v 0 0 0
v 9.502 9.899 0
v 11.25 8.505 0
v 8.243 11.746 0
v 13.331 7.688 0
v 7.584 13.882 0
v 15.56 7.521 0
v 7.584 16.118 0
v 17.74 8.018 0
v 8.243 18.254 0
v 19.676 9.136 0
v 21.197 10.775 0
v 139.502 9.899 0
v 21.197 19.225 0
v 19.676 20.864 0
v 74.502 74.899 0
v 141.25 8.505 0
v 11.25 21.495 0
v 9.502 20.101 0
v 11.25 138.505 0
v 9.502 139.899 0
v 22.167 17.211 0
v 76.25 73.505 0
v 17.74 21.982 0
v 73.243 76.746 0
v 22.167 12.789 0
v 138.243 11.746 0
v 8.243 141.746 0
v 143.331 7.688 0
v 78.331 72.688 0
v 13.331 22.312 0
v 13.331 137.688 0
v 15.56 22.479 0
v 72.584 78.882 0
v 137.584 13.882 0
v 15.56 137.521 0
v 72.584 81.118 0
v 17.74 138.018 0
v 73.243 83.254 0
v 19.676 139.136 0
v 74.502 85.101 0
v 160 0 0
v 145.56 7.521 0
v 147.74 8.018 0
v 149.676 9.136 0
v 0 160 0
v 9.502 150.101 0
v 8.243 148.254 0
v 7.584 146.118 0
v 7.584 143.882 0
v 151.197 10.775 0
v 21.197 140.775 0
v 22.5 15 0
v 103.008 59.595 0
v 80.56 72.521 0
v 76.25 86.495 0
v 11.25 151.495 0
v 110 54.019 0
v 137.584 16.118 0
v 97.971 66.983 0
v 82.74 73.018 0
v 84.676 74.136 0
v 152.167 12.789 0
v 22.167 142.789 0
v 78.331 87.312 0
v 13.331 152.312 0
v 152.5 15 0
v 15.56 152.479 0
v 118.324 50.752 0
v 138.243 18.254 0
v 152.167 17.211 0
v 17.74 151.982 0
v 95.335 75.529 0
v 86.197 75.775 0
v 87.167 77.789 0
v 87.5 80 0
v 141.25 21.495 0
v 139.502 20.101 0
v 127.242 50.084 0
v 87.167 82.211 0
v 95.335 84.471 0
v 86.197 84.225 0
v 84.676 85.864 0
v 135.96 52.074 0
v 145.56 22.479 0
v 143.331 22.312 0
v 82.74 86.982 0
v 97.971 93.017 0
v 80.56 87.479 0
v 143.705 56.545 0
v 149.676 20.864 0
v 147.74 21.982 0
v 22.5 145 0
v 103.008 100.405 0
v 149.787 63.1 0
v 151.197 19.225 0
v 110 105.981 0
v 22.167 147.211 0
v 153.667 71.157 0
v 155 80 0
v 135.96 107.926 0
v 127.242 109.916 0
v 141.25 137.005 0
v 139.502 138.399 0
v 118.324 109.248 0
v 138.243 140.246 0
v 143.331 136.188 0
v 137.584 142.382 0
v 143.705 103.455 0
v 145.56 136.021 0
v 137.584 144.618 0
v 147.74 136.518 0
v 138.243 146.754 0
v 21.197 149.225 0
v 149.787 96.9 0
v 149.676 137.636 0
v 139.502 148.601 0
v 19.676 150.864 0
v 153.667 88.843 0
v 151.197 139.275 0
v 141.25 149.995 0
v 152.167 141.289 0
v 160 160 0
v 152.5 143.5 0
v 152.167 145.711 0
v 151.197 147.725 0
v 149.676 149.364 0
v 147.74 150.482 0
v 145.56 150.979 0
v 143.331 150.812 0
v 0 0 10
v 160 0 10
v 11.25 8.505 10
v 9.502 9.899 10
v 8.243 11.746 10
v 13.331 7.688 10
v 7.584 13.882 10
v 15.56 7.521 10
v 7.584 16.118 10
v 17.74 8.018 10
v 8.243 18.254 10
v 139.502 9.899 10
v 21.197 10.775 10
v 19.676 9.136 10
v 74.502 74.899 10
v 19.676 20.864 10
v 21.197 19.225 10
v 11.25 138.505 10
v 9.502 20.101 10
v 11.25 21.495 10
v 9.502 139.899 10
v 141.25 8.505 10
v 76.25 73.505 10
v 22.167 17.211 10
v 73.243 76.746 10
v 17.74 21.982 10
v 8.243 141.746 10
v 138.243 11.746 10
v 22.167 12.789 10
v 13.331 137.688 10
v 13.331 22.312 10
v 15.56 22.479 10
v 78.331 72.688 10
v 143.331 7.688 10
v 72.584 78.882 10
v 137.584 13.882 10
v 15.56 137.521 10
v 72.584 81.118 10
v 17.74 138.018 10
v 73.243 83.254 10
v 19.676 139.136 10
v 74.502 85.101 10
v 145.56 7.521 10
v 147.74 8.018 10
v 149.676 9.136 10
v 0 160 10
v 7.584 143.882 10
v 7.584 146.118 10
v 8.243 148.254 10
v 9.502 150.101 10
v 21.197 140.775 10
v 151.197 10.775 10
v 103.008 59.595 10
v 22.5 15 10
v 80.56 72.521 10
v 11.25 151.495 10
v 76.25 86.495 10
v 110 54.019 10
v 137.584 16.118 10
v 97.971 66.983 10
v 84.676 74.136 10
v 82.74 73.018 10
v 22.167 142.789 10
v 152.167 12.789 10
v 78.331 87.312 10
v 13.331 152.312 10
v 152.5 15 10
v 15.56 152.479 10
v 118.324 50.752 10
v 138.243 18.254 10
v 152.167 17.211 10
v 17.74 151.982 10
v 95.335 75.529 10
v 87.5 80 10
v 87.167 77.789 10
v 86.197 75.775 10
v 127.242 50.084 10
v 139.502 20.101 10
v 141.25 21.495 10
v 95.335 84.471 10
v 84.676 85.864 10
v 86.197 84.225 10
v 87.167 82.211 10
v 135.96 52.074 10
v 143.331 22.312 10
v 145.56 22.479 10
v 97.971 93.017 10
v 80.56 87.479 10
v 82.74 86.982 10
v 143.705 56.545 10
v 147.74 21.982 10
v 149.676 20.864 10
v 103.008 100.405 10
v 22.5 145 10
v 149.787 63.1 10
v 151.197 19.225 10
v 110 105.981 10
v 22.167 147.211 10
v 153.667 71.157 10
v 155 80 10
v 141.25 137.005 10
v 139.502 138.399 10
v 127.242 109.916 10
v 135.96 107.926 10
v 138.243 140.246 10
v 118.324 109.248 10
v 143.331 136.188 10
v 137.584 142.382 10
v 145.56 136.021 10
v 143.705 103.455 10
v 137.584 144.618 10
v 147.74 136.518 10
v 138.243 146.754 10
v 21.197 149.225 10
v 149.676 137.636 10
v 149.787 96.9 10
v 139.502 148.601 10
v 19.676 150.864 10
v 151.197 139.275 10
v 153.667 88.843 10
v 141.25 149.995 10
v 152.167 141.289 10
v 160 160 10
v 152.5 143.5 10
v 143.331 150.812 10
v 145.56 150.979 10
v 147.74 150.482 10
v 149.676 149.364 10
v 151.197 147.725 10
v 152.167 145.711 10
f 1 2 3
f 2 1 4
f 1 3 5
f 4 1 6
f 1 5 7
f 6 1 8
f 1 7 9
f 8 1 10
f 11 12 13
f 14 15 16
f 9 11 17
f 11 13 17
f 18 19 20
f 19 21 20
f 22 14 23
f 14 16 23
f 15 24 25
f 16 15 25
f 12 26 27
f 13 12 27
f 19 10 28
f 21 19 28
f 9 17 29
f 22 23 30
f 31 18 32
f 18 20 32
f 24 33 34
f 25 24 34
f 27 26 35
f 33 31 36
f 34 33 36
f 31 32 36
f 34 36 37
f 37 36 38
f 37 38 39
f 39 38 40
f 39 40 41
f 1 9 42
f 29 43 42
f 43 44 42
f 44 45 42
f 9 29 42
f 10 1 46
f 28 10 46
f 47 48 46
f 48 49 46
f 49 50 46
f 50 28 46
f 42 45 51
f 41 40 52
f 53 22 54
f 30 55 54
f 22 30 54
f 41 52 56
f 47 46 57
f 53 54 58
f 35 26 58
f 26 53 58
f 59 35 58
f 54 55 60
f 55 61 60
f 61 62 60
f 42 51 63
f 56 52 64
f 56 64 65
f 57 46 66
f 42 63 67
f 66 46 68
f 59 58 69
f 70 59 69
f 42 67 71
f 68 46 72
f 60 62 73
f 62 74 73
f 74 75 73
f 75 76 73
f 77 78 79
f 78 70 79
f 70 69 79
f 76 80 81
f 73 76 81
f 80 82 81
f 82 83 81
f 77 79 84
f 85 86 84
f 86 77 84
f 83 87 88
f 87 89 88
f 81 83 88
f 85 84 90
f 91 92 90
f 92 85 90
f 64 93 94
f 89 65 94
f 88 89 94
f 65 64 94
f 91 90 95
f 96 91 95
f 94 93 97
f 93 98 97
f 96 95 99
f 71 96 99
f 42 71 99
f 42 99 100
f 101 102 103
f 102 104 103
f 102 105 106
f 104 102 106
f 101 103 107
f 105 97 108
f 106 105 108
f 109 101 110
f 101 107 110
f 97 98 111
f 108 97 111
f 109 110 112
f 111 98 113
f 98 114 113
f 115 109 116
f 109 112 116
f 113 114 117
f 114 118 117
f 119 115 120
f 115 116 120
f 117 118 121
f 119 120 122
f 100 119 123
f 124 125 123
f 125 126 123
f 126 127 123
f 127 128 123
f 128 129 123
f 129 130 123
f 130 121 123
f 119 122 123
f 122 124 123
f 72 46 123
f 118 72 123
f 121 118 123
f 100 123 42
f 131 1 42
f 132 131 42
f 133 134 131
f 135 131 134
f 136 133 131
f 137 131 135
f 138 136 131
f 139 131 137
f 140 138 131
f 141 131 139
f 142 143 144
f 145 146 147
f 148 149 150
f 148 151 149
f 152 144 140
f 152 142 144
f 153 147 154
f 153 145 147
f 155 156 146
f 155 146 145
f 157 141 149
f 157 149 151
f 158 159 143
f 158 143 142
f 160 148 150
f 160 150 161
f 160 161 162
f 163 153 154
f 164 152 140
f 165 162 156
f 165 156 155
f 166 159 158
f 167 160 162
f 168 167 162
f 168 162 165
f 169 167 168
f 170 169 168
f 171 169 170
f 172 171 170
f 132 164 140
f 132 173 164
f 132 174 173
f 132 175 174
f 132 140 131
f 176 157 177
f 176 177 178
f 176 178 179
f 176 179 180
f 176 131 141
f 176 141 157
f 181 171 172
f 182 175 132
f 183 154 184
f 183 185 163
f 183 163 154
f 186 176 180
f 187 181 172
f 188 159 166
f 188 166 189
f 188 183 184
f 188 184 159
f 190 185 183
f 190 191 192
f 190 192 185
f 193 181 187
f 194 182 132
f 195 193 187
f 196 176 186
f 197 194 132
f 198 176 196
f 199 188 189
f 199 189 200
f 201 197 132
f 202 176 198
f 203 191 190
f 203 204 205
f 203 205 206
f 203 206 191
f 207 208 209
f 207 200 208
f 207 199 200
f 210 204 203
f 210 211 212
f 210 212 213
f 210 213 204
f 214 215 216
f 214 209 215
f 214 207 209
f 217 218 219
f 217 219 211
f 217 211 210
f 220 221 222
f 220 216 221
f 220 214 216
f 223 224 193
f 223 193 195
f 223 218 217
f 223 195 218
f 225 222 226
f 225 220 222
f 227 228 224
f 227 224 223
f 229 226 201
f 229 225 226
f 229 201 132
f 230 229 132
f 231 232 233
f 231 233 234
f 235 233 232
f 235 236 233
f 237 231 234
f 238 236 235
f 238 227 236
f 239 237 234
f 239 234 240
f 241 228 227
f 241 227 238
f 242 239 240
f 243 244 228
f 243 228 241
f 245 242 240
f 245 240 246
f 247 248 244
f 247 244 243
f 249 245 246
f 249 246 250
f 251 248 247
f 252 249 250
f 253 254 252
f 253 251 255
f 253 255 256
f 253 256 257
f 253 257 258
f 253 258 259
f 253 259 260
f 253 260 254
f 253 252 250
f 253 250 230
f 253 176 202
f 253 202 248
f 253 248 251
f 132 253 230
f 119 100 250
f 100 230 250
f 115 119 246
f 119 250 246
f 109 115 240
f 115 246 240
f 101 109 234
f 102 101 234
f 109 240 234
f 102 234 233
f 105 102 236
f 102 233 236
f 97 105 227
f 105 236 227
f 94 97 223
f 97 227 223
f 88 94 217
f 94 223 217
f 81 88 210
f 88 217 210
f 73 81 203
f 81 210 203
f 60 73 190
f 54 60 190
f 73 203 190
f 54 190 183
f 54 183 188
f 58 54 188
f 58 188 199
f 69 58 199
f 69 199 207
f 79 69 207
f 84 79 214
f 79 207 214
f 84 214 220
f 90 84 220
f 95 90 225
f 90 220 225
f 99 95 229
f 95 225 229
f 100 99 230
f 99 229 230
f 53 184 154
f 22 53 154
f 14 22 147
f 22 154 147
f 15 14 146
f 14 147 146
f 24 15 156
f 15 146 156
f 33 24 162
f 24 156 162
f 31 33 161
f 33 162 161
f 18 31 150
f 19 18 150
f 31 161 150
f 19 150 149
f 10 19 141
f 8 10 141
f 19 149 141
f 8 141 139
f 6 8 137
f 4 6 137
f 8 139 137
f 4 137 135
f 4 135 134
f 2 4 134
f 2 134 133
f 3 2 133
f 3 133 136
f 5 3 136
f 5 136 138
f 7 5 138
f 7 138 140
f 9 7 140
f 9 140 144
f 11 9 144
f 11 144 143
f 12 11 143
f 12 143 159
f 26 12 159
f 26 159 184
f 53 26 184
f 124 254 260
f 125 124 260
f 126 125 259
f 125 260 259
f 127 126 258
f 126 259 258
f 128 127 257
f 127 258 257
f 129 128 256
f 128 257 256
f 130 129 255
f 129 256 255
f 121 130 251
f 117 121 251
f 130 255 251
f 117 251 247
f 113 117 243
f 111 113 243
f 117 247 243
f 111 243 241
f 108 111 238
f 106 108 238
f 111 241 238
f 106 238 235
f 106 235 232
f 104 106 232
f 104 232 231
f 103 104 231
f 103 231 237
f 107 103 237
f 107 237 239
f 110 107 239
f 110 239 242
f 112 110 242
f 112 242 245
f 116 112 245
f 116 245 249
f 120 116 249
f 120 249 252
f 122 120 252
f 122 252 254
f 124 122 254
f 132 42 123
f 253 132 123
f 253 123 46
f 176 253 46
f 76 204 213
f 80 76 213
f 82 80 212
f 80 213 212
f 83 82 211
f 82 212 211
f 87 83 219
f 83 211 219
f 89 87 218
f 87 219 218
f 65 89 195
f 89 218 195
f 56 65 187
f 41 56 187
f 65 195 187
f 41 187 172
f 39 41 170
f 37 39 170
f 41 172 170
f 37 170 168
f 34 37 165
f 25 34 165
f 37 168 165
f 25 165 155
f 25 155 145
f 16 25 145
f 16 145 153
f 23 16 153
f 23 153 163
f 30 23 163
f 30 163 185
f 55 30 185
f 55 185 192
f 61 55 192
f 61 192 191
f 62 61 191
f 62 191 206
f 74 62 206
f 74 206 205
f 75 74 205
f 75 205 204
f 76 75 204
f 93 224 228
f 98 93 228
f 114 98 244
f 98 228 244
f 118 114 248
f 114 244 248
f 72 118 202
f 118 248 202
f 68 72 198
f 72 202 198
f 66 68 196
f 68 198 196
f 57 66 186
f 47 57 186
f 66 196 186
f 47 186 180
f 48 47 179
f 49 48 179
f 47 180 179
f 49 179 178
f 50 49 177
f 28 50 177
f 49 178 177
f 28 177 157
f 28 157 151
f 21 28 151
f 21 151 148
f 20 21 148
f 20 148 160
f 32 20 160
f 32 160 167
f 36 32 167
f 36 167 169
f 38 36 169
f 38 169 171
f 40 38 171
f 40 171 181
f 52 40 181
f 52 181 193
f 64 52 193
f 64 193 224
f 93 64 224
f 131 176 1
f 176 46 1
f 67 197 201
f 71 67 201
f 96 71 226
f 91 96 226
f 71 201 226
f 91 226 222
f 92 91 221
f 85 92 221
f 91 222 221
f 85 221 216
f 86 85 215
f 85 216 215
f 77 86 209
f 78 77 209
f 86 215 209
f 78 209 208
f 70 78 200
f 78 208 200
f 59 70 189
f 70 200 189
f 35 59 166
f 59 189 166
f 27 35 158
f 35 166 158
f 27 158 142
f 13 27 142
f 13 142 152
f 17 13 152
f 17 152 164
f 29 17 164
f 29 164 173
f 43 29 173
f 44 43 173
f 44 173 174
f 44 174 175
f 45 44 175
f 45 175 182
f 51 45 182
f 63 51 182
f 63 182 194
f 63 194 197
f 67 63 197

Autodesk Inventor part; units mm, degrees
ref_plane "YZ Plane" through (0, 0, 0) normal (1, 0, 0) x (0, 1, 0)
ref_plane "XZ Plane" through (0, 0, 0) normal (0, 1, 0) x (-1, 0, 0)
ref_plane "XY Plane" through (0, 0, 0) normal (0, 0, 1) x (1, 0, 0)
sketch "Sketch1" plane through (0, 0, 0) normal (0, 0, 1) x (1, 0, 0)
  line L0 (0, 0) -> (160, 0)
  line L1 (160, 0) -> (160, 160)
  line L2 (160, 160) -> (0, 160)
  line L3 (0, 160) -> (0, 0)
  dimension "d0" = 160
  dimension "d1" = 160
extrude "Extrusion1" add sketch "Sketch1" along normal blind 10
sketch "Sketch2" plane through (0, 0, 10) normal (0, 0, 1) x (1, 0, 0)
  line L0 (0, 0) -> (160, 0) projected
  line L1 (0, 0) -> (15, 0)
  line L2 (15, 0) -> (15, 15)
  line L3 (160, 160) -> (0, 160) projected
  line L4 (0, 160) -> (15, 160)
  line L5 (15, 160) -> (15, 145)
  line L6 (160, 0) -> (160, 160) projected
  line L7 (160, 160) -> (145, 160)
  line L8 (145, 160) -> (145, 143.5)
  line L9 (160, 0) -> (160, 15)
  line L10 (160, 15) -> (145, 15)
  circle A0 centre (15, 145) radius 7.5
  circle A1 centre (145, 143.5) radius 7.5
  circle A2 centre (145, 15) radius 7.5
  circle A3 centre (15, 15) radius 7.5
  dimension "d4" = 15
  dimension "d5" = 15
  dimension "d6" = 15
  dimension "d7" = 15
  dimension "d8" = 15
  dimension "d9" = 16.5
  dimension "d10" = 15
  dimension "d11" = 15
  dimension "d12" = 15
  dimension "d13" = 15
  dimension "d14" = 15
  dimension "d15" = 15
extrude "Extrusion2" cut sketch "Sketch2" against normal blind 10
sketch "Sketch3" plane through (0, 0, 10) normal (0, 0, 1) x (1, 0, 0)
  line L0 (0, 160) -> (0, 0) projected
  line L1 (0, 0) -> (80, 0)
  line L2 (0, 0) -> (160, 0) projected
  line L3 (80, 0) -> (0, 0)
  line L4 (0, 0) -> (80, 0)
  dimension "d18" = 80
  dimension "d19" = 80
  dimension "d20" = 80
sketch "Sketch4" plane through (0, 0, 10) normal (0, 0, 1) x (1, 0, 0)
  line L0 (0, 0) -> (0, 80)
  line L1 (0, 160) -> (0, 0) projected
  line L2 (0, 80) -> (80, 80)
  circle A0 centre (80, 80) radius 7.5
  dimension "d21" = 80
  dimension "d22" = 80
  dimension "d23" = 15
extrude "Extrusion3" cut sketch "Sketch4" against normal blind 10
sketch "Sketch5" plane through (0, 0, 10) normal (0, 0, 1) x (1, 0, 0)
  line L0 (160, 0) -> (160, 160) projected
  line L1 (160, 0) -> (160, 80)
  line L2 (160, 80) -> (125, 80)
  circle A0 centre (125, 80) radius 30
  point P0 (0, 0)
  dimension "d26" = 80
  dimension "d27" = 35
  dimension "d28" = 60
extrude "Extrusion4" cut sketch "Sketch5" against normal blind 10
properties part number "100"
